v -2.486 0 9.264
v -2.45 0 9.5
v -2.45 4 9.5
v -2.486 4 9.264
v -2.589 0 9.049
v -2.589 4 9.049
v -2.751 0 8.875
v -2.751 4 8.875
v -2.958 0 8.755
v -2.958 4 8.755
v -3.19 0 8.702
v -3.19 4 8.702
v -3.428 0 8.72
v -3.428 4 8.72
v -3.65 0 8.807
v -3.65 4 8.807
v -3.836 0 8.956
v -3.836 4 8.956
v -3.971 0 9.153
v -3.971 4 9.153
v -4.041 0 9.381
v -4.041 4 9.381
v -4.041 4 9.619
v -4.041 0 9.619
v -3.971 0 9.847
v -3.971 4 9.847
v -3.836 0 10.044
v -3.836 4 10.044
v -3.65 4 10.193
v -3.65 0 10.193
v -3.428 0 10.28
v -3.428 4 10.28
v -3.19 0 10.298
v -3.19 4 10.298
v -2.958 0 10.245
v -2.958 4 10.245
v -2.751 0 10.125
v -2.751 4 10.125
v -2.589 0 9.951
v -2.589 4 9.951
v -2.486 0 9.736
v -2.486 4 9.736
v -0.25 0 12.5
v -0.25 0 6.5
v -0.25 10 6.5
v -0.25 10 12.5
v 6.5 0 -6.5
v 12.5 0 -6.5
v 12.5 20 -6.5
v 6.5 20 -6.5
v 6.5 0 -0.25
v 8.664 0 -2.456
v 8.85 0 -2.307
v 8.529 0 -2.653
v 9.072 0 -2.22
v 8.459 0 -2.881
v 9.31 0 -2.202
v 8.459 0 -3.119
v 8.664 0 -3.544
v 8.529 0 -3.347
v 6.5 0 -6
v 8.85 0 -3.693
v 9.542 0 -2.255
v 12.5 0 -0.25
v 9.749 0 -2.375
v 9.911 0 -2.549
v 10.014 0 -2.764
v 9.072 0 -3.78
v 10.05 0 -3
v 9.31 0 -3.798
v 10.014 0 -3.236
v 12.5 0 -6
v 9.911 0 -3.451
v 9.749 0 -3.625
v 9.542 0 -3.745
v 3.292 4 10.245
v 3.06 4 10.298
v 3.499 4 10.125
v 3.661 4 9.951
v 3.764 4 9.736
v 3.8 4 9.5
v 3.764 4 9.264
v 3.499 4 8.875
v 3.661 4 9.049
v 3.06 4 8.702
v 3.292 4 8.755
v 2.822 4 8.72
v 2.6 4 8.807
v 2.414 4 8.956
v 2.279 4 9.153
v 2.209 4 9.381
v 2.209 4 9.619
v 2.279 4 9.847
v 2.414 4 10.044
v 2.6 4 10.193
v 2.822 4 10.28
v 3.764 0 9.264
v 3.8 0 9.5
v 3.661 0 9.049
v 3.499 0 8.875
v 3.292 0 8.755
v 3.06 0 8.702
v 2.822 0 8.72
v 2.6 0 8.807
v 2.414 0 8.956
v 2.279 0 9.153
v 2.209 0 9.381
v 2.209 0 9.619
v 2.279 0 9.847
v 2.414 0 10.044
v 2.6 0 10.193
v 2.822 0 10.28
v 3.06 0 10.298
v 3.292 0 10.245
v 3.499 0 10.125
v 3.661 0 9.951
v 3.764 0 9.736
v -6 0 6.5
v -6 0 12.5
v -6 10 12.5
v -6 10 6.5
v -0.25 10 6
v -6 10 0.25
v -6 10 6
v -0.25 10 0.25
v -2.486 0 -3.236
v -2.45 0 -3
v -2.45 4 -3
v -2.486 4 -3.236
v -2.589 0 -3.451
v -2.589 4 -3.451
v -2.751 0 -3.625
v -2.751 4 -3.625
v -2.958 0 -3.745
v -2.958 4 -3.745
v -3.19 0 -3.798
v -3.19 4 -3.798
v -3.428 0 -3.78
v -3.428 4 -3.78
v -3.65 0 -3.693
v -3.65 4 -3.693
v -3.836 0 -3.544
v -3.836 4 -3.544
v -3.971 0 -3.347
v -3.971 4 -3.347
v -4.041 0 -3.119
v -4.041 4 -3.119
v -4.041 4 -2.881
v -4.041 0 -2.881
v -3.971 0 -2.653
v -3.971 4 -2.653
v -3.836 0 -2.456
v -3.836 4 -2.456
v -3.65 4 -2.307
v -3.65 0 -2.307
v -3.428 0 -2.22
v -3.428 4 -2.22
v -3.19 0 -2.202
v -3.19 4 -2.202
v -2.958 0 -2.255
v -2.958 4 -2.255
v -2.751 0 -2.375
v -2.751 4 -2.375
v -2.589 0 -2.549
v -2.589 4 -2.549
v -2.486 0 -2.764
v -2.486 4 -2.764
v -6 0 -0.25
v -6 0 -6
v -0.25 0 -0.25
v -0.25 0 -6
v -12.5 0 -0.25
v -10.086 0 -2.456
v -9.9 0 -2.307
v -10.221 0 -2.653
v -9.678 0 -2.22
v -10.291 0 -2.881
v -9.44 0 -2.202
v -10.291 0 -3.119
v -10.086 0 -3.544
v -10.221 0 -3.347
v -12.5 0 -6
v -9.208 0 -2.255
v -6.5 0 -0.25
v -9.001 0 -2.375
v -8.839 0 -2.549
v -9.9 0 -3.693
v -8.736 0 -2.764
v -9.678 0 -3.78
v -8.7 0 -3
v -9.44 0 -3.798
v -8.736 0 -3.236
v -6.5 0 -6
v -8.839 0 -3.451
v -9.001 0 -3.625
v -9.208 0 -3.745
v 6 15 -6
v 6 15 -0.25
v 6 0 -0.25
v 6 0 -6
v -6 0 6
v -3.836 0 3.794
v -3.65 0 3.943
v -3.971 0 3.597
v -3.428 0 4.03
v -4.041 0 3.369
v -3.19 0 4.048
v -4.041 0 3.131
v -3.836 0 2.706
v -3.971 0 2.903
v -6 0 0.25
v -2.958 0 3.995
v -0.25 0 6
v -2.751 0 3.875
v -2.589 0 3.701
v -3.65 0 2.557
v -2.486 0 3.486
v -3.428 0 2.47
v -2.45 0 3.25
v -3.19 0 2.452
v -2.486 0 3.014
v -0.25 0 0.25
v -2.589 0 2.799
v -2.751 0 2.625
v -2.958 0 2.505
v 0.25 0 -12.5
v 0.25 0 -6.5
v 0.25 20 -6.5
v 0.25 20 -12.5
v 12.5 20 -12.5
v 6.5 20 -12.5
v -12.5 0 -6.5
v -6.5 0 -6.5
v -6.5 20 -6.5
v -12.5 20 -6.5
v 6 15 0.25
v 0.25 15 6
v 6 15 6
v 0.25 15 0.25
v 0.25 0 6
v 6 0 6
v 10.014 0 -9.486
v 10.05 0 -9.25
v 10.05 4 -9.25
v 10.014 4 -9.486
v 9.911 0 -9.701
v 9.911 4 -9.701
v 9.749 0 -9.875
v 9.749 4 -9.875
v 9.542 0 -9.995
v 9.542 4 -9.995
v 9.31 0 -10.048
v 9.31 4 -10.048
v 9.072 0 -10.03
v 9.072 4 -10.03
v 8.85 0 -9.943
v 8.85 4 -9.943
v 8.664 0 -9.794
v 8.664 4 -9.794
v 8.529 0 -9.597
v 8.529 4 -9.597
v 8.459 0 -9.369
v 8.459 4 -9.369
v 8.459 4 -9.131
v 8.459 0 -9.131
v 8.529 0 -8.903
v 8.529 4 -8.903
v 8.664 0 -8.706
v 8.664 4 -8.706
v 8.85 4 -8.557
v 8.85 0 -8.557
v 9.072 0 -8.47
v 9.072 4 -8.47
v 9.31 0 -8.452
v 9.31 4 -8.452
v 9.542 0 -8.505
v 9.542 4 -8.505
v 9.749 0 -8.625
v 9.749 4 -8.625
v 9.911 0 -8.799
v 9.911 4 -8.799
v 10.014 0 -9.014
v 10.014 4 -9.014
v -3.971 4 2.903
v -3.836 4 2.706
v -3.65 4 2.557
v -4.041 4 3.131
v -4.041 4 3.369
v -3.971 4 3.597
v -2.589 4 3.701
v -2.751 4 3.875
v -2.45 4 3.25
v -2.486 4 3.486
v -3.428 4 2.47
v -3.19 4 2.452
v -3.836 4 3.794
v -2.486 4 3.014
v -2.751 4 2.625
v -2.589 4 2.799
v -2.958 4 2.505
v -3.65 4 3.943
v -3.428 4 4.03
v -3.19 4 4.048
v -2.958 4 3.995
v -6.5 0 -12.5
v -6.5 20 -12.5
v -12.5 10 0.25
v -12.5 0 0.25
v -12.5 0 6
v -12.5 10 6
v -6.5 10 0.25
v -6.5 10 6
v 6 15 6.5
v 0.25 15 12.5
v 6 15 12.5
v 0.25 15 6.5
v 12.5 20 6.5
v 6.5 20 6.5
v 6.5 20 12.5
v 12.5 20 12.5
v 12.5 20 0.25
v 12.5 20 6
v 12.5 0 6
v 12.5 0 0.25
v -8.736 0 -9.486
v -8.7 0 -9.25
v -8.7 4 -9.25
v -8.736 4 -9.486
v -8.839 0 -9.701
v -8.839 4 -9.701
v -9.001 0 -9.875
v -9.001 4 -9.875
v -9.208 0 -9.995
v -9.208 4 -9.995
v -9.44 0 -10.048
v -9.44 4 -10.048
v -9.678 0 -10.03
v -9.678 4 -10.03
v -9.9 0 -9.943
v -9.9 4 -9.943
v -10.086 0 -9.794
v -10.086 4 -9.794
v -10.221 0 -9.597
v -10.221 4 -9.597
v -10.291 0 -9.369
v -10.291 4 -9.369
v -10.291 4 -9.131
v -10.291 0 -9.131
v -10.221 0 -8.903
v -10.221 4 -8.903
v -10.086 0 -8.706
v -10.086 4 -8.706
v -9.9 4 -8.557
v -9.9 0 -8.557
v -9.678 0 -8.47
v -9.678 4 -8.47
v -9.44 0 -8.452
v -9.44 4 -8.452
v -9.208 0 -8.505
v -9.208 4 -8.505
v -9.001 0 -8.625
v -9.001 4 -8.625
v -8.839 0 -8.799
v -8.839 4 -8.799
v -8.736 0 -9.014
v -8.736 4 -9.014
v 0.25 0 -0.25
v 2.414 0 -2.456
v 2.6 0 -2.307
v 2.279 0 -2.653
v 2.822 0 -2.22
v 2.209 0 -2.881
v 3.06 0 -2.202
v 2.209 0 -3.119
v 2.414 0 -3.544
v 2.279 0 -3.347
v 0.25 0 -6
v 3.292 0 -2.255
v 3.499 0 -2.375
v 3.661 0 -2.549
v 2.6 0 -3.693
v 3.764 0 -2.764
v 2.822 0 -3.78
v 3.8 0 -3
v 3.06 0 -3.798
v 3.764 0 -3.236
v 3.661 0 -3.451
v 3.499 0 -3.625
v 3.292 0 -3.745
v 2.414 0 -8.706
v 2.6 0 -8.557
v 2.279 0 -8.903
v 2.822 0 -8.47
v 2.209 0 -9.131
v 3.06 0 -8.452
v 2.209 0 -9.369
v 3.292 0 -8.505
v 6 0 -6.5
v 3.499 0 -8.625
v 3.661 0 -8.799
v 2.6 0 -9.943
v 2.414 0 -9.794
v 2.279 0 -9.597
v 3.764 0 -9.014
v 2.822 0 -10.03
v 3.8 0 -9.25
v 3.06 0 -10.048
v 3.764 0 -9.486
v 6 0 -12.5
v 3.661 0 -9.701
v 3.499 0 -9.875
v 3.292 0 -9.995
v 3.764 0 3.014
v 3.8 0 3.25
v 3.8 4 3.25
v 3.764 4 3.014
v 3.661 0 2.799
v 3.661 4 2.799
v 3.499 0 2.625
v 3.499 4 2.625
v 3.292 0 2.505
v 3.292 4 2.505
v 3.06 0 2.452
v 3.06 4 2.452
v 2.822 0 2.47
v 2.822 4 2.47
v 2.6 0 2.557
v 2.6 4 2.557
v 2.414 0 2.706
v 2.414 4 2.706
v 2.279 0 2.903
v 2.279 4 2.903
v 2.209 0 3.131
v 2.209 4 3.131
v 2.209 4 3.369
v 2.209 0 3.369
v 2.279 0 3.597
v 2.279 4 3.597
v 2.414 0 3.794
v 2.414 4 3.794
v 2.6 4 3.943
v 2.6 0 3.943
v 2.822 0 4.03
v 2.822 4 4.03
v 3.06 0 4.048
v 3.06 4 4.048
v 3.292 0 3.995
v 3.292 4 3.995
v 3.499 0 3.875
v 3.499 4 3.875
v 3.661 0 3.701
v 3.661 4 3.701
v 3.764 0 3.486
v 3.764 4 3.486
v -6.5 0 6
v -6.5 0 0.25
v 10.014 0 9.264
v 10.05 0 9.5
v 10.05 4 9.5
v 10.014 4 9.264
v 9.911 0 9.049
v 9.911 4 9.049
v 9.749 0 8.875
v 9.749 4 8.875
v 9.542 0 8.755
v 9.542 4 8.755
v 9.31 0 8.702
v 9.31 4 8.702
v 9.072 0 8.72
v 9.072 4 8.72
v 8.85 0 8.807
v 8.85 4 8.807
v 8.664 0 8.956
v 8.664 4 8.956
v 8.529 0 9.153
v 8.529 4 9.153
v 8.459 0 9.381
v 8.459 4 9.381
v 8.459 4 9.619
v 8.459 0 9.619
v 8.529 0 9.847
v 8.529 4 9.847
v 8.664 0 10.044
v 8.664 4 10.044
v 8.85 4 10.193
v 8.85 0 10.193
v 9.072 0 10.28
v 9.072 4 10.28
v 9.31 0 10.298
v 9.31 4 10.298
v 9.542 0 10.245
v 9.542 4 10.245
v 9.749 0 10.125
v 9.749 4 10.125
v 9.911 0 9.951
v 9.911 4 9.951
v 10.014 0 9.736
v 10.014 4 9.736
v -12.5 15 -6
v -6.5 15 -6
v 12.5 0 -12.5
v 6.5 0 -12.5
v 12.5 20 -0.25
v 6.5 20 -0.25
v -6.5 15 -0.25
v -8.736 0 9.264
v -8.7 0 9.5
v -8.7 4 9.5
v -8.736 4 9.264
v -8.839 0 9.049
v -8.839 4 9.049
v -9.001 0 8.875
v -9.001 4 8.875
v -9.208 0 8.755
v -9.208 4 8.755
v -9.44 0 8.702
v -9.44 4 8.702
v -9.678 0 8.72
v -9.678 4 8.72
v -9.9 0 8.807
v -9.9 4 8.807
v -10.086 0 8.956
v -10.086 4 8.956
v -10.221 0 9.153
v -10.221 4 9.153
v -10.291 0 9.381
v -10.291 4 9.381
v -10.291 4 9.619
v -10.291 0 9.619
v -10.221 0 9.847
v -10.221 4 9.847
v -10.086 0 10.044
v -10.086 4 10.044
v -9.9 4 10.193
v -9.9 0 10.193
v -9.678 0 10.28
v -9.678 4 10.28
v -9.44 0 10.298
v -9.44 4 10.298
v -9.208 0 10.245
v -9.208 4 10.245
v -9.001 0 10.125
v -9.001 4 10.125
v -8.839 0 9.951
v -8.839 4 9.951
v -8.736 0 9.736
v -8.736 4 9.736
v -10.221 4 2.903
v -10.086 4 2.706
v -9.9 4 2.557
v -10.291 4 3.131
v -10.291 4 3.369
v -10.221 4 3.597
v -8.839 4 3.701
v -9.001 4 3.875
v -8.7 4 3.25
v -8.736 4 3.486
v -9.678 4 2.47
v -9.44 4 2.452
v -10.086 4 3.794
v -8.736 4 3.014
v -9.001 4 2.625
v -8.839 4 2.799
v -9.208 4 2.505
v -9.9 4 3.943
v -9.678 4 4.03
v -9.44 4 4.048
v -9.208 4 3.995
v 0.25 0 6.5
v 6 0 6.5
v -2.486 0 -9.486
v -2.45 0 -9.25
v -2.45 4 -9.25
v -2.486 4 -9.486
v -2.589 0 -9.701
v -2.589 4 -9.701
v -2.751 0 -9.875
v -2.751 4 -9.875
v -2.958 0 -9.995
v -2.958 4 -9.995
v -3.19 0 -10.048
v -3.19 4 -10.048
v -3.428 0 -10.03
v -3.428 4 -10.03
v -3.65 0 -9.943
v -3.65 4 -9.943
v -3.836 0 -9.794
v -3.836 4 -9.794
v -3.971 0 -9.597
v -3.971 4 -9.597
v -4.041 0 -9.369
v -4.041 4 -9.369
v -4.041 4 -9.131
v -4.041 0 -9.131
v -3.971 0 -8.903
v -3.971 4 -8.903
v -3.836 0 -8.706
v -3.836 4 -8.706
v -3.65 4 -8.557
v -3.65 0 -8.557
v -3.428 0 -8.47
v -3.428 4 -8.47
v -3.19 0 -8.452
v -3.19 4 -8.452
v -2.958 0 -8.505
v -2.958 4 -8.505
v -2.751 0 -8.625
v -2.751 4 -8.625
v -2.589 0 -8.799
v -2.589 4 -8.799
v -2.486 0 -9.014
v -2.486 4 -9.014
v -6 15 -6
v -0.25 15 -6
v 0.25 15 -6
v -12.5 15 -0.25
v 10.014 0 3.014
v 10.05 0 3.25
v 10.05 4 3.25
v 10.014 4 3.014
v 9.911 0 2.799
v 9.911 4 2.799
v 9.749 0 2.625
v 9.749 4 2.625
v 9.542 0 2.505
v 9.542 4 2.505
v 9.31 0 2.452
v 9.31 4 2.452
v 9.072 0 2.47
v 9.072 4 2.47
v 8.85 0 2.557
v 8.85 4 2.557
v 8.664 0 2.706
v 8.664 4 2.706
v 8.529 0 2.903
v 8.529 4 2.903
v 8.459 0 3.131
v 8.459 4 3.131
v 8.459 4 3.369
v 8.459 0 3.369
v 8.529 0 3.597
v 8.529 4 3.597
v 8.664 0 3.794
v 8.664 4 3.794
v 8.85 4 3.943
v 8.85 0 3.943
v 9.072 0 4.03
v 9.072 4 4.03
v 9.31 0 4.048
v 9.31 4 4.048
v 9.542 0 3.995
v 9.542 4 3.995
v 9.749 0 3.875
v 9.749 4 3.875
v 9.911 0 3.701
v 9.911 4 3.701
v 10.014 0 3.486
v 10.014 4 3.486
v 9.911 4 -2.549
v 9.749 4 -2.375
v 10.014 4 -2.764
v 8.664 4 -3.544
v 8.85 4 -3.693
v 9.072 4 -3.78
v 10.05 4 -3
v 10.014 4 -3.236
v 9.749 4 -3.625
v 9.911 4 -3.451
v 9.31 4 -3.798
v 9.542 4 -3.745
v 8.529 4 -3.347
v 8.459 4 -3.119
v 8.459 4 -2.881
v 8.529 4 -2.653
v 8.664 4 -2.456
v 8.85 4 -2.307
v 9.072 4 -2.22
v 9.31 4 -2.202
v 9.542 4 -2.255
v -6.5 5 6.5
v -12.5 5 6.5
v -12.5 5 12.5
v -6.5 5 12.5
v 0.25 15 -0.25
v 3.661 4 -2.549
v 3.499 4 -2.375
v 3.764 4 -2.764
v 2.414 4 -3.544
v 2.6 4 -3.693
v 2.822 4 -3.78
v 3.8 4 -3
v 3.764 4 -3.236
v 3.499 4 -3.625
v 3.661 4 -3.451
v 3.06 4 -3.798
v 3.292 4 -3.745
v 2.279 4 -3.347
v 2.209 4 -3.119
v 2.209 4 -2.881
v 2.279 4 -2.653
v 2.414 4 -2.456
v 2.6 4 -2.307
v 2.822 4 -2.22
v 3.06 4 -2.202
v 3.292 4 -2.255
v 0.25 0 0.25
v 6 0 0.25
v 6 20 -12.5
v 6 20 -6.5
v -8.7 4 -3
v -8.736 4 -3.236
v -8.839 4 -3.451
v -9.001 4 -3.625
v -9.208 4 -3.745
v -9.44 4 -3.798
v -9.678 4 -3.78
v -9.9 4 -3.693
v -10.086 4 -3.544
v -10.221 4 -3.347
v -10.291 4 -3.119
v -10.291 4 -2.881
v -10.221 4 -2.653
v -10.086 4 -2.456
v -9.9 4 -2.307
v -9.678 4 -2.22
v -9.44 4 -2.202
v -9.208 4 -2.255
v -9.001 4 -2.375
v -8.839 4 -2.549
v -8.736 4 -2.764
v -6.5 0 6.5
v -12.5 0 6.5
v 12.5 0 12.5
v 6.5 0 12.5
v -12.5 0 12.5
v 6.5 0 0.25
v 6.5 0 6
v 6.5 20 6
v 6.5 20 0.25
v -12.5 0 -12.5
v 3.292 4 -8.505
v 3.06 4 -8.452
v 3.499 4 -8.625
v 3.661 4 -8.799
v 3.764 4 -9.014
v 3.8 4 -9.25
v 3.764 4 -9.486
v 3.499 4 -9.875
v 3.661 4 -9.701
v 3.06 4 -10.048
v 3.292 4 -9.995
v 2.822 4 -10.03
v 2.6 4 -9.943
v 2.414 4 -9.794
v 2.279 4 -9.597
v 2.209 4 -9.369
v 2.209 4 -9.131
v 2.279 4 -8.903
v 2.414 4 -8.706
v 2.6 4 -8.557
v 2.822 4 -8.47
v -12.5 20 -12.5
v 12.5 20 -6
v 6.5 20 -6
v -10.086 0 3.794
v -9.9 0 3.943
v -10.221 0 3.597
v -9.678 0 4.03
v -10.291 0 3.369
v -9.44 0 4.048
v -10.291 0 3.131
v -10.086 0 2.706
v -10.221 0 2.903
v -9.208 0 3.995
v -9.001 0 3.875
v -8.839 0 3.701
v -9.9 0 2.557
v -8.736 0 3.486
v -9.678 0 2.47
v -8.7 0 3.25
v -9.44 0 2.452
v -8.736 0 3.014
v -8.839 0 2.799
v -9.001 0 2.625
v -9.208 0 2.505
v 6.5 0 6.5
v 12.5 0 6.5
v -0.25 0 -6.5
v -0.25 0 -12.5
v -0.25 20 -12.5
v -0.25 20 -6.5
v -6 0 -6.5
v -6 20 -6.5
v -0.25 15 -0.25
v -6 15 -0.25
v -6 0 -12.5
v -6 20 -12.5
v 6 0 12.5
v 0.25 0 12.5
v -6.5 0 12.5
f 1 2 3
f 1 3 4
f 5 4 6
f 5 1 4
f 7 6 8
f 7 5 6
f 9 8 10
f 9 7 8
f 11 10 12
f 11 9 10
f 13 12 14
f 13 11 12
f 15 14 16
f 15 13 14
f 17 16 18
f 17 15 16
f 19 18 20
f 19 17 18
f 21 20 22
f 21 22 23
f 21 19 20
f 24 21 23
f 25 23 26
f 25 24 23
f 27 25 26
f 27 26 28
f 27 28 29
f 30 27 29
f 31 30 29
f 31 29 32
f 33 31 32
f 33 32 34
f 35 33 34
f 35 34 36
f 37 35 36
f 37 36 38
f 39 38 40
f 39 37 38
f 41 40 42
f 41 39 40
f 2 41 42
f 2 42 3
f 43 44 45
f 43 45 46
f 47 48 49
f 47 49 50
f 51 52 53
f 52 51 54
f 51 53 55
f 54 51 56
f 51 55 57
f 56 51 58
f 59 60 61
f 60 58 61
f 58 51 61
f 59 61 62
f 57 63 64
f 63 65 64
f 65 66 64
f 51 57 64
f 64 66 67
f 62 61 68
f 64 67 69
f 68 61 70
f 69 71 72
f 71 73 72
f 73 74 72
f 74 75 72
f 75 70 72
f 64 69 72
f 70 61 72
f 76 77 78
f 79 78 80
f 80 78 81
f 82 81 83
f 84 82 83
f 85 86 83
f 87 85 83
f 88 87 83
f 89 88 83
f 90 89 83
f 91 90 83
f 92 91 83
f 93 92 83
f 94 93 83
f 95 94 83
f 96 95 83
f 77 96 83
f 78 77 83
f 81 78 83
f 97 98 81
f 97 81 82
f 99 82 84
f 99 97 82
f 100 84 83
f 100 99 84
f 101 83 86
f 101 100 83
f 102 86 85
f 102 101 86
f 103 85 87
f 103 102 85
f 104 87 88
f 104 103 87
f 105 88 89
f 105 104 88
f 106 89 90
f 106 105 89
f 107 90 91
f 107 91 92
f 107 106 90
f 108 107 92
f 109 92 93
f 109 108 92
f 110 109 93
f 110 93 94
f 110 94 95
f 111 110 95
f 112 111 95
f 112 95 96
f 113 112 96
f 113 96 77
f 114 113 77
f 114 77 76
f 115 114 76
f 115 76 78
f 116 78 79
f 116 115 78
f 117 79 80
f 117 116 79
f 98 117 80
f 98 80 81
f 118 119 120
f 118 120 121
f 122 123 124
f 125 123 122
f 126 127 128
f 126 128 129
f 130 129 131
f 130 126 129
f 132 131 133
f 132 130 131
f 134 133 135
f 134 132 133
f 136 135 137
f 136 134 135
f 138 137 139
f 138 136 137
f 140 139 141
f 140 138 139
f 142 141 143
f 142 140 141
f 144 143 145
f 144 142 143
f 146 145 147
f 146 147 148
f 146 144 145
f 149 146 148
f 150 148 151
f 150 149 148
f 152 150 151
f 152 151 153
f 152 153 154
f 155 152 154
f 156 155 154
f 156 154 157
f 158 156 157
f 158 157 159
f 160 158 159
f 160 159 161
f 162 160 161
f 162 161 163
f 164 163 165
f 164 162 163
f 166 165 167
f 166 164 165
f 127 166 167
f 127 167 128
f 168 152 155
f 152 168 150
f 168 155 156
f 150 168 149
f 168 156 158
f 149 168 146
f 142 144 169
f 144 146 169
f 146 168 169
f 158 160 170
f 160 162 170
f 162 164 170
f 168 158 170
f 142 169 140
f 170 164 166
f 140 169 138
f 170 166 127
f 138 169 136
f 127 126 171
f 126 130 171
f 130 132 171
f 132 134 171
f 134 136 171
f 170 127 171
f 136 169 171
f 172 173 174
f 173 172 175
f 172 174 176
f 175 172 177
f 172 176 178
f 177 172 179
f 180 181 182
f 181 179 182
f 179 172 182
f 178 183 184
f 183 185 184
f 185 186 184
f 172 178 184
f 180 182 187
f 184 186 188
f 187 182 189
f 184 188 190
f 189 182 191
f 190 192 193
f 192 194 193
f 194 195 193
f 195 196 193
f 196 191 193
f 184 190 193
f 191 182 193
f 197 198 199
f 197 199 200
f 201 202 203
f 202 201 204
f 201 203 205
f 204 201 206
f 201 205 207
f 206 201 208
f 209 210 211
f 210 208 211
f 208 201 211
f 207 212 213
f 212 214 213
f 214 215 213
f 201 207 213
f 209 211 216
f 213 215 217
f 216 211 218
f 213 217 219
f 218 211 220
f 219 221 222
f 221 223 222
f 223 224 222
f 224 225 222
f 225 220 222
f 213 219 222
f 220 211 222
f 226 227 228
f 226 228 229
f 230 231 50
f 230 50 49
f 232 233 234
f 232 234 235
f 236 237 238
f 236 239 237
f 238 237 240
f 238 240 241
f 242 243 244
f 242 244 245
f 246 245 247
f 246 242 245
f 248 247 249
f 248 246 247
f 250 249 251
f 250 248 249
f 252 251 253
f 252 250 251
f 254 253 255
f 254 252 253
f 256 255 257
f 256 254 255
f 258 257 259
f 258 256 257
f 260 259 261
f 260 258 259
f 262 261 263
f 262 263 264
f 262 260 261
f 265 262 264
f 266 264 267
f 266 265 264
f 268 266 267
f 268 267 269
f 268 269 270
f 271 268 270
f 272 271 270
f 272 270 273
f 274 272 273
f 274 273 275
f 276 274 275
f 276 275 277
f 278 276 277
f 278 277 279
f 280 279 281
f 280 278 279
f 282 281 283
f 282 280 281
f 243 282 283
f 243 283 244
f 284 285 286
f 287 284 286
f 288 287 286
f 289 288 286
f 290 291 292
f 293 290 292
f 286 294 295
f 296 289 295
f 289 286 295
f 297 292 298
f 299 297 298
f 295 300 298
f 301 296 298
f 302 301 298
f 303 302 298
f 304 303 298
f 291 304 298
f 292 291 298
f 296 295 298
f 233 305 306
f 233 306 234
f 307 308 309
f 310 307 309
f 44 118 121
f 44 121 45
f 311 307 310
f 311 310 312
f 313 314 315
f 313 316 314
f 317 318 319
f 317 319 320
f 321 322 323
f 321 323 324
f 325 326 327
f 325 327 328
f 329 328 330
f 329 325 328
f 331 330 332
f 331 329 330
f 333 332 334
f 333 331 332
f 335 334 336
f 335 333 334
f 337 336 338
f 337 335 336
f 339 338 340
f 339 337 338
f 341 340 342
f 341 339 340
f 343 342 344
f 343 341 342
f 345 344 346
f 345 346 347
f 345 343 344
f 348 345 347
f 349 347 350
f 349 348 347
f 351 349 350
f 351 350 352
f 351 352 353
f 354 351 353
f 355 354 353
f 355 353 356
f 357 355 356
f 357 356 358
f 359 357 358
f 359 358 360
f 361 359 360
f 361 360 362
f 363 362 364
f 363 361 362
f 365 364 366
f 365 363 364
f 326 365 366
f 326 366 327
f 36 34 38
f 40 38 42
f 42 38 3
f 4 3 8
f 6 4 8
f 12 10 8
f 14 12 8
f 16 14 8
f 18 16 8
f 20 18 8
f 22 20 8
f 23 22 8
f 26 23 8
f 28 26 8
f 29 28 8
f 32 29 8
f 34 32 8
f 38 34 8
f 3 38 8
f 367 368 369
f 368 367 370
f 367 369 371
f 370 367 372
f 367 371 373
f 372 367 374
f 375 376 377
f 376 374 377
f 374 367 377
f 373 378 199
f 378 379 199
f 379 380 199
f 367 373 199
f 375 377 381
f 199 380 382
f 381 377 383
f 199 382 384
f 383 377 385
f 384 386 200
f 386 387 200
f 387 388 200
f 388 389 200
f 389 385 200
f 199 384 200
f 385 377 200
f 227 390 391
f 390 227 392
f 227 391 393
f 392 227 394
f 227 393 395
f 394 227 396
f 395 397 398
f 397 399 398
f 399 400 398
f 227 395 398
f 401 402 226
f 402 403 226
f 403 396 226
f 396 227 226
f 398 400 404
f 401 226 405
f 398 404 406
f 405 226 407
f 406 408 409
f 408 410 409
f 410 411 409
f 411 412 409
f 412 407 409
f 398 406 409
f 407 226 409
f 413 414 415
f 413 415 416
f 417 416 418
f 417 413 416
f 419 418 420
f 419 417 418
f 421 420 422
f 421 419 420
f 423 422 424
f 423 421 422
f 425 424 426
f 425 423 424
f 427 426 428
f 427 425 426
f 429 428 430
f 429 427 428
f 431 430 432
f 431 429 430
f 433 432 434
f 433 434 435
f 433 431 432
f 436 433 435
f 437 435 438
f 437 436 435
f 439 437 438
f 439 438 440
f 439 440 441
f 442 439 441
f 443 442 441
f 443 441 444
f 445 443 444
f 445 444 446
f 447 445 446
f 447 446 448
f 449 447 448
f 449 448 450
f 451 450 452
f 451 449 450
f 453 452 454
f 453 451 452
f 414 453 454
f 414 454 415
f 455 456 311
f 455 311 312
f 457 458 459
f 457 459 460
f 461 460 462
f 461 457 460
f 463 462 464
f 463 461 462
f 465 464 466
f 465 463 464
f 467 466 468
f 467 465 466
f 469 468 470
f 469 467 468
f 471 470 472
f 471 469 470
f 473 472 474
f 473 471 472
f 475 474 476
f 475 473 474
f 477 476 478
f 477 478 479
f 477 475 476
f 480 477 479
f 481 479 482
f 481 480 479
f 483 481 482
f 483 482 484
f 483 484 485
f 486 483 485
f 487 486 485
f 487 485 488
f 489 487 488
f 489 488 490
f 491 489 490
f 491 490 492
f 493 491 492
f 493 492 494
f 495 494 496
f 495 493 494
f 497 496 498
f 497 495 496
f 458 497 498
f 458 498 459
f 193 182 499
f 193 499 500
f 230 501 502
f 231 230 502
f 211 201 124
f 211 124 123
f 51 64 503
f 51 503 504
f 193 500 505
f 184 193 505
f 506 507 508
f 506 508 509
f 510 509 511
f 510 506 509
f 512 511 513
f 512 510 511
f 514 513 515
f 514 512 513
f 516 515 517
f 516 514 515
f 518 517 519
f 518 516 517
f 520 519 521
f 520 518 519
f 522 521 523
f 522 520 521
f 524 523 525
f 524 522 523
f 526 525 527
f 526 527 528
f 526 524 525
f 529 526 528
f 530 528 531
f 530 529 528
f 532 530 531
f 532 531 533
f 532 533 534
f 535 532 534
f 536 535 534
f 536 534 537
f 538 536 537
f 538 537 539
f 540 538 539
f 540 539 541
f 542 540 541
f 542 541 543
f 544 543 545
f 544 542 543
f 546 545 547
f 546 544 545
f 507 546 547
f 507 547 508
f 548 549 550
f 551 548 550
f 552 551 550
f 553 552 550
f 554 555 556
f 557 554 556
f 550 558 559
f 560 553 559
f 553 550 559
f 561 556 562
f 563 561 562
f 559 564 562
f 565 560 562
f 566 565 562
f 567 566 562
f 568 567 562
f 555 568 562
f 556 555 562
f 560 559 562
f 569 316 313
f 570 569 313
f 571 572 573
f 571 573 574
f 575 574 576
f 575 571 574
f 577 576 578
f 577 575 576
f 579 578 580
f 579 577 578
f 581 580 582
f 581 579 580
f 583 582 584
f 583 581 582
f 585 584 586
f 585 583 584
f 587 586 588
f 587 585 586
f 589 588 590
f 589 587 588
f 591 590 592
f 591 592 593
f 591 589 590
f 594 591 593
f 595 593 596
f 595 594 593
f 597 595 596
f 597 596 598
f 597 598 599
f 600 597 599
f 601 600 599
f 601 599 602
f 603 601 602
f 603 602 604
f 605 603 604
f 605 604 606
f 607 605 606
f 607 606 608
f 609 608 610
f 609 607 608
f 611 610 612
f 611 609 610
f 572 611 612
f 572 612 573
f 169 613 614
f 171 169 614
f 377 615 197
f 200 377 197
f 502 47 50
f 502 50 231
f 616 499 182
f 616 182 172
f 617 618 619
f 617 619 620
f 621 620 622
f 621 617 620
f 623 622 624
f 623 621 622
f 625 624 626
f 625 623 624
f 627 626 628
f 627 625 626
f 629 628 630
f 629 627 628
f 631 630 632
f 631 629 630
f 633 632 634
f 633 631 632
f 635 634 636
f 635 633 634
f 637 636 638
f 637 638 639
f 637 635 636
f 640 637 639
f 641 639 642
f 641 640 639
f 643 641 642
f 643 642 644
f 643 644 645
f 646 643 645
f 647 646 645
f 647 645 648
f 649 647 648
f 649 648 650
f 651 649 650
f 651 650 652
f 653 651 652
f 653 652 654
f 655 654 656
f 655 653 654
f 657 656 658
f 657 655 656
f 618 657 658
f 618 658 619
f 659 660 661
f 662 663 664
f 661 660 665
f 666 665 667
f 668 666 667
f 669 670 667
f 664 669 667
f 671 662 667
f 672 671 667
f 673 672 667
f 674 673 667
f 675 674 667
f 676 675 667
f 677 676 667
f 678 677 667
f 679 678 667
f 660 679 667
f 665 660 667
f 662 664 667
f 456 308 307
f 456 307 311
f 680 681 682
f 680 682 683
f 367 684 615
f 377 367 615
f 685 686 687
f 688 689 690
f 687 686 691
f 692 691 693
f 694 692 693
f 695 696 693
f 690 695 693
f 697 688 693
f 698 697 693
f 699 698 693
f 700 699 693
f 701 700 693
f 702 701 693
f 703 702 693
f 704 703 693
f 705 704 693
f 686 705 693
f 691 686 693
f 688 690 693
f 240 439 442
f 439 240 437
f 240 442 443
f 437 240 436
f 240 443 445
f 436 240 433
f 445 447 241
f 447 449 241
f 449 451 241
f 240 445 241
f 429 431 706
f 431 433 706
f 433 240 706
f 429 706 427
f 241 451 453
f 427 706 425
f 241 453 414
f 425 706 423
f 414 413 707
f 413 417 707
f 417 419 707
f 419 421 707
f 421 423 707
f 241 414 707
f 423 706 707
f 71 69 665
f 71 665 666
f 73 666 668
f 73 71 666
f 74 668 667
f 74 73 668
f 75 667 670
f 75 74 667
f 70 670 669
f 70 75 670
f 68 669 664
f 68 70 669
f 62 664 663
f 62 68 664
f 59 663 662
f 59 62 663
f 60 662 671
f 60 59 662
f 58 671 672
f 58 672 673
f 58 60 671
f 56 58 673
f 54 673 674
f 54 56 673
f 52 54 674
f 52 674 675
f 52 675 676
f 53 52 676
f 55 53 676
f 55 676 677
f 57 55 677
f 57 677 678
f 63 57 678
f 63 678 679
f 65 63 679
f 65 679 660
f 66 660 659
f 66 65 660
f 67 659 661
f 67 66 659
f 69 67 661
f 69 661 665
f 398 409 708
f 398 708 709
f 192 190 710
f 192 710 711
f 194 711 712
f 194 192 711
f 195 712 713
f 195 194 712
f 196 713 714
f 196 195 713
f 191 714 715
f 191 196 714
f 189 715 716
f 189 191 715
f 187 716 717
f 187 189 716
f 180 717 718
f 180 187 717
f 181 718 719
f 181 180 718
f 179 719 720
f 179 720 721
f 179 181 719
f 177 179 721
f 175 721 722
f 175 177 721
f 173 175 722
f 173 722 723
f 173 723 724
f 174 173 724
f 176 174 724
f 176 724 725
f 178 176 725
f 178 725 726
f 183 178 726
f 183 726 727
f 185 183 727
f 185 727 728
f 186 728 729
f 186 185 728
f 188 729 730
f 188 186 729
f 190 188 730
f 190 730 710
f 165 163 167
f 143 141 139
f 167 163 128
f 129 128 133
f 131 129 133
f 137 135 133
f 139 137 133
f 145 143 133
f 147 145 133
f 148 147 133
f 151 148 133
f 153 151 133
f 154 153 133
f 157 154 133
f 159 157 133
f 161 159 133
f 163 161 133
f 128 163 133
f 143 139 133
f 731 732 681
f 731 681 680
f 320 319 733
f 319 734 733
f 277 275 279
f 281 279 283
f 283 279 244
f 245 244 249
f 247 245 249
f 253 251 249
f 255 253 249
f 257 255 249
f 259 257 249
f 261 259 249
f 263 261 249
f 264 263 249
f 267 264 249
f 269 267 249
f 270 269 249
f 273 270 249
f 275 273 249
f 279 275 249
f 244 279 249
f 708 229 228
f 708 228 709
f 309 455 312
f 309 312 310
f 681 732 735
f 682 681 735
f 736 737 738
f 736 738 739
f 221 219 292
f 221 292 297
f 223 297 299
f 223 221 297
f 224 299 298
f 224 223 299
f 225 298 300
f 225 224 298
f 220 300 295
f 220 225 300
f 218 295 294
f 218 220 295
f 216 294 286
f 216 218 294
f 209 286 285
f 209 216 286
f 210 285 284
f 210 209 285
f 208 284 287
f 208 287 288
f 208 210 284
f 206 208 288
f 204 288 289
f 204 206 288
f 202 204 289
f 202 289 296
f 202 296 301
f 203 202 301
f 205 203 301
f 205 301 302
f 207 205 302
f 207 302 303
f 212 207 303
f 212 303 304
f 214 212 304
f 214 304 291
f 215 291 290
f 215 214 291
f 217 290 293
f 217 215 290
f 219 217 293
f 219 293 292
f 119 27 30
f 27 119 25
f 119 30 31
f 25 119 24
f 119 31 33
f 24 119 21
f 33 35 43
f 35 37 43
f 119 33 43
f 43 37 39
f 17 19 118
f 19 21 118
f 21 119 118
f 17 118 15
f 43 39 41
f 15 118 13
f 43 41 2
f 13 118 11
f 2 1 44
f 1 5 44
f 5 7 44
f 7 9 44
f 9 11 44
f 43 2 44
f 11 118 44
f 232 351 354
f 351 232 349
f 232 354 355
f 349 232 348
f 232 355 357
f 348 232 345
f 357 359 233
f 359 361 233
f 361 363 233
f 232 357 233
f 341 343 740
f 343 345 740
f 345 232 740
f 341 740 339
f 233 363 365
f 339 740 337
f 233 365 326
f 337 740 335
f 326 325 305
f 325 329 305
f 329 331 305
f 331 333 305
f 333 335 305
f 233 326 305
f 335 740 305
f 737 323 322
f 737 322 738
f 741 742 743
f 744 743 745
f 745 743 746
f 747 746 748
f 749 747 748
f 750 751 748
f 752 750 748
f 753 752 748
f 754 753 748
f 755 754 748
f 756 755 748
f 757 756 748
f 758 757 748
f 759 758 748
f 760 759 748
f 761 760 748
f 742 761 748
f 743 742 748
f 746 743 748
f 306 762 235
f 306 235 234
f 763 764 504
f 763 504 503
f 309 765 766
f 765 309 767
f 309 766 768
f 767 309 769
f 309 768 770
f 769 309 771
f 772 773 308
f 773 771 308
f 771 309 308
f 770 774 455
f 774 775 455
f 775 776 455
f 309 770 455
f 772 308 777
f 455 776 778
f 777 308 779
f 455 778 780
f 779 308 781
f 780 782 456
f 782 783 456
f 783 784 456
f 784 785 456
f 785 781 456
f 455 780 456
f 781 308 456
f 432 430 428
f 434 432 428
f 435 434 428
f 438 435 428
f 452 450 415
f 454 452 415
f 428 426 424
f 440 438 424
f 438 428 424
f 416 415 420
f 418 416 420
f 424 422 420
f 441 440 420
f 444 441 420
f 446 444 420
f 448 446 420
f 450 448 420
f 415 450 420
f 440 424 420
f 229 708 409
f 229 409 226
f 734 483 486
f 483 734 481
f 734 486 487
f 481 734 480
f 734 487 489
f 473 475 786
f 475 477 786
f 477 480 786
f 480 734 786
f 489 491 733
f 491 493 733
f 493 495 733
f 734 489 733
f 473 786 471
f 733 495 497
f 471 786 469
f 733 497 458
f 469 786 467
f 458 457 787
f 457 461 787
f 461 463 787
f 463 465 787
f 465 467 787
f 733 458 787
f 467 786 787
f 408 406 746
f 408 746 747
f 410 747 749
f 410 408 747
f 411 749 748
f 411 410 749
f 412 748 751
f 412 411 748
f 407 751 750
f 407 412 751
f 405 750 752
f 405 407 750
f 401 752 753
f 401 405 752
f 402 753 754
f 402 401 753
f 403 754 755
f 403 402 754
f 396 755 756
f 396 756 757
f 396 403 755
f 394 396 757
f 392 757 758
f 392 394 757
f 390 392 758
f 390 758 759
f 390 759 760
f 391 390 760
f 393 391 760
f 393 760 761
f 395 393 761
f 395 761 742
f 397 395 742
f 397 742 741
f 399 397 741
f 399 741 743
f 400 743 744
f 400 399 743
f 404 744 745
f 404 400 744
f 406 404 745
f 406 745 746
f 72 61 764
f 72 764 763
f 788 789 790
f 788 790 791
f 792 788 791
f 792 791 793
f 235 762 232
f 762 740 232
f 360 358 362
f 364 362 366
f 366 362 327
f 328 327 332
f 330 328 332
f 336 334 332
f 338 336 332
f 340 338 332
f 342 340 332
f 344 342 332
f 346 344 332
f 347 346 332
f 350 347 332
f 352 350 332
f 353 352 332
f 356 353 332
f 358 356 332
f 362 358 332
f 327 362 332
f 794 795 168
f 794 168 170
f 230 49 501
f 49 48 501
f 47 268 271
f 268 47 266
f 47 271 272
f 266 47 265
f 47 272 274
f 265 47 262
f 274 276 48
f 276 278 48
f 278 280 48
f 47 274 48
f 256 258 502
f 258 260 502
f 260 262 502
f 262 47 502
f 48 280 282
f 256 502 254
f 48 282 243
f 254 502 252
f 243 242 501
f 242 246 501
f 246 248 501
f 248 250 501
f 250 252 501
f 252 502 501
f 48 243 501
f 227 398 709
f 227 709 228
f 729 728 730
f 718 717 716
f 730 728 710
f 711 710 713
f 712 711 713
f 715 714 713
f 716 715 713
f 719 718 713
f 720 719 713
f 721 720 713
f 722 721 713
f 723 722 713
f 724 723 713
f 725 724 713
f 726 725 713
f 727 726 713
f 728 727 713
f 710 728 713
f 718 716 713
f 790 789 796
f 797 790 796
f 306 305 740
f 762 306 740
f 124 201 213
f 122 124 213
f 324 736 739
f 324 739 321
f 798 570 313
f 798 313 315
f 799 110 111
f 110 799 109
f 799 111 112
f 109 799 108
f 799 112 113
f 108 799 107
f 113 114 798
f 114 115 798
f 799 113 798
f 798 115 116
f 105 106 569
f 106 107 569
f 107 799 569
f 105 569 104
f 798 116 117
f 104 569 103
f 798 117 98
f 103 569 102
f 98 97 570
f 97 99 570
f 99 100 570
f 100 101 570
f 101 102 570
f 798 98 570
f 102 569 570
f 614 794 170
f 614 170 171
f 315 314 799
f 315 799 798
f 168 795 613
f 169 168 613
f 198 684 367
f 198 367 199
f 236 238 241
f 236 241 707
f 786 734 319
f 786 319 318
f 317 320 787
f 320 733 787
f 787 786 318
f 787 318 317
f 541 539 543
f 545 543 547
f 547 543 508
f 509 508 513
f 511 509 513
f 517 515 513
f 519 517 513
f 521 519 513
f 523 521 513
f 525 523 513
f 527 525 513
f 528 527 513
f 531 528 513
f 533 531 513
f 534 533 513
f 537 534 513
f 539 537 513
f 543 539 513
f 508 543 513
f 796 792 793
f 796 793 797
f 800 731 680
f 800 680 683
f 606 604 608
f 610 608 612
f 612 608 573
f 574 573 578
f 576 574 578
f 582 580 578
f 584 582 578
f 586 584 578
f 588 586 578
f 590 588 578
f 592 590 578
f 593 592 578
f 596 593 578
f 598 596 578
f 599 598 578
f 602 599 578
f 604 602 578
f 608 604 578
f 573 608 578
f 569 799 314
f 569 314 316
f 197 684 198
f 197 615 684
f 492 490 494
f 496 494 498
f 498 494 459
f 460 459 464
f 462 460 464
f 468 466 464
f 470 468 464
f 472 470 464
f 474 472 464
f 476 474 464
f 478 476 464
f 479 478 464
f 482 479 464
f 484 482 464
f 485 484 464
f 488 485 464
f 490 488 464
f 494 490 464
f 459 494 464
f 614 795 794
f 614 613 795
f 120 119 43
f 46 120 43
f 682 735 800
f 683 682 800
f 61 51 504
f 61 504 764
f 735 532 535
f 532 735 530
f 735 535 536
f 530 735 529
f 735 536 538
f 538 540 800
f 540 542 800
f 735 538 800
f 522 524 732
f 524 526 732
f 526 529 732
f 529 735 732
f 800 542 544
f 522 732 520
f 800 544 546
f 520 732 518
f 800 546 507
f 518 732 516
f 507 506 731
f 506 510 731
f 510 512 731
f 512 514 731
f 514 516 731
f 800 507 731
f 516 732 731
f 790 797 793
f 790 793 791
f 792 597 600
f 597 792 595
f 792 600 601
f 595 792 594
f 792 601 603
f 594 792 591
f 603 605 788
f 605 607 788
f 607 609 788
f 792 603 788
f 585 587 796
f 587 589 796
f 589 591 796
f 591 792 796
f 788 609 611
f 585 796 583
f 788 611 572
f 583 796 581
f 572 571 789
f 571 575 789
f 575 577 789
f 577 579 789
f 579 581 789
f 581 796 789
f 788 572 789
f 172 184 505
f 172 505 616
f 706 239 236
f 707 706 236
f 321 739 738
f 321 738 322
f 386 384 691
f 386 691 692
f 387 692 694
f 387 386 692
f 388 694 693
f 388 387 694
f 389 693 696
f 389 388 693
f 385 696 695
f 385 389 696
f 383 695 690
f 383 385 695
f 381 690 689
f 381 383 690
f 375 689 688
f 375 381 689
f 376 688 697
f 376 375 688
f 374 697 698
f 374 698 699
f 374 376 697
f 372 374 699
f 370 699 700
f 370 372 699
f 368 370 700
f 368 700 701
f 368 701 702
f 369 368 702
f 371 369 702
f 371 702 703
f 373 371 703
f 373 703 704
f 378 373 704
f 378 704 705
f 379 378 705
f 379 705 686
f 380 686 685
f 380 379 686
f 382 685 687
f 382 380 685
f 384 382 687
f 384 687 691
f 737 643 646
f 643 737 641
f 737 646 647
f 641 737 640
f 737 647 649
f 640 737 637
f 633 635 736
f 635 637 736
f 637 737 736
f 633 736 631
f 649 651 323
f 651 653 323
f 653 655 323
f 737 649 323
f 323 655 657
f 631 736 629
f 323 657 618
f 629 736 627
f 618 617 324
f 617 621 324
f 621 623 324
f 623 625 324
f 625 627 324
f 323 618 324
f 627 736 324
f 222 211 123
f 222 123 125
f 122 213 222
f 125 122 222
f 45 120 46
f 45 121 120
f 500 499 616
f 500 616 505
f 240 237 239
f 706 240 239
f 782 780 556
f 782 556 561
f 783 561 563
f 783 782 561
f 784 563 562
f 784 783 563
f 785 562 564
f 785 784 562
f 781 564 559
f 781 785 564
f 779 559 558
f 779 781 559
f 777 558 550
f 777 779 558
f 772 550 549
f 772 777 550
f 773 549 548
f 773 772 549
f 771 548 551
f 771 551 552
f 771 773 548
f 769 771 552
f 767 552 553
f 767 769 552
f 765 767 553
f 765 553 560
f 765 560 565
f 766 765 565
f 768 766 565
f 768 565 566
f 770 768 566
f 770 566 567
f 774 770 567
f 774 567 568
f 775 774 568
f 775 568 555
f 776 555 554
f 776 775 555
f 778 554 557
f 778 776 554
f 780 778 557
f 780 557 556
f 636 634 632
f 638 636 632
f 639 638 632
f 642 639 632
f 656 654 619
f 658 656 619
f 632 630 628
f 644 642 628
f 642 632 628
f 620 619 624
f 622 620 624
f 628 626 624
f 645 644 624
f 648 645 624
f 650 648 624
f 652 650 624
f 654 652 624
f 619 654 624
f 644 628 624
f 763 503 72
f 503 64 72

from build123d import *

# Parameters (mm, degrees)
SKETCH1_W           = 25
SKETCH1_H           = 25
BOSS_EXTRUDE1_DEPTH = 5
BOSS_EXTRUDE2_DEPTH = 10
BOSS_EXTRUDE3_DEPTH = 15
BOSS_EXTRUDE4_DEPTH = 20
SKETCH3_W           = 5.75
SKETCH3_H           = 5.75
CUT_EXTRUDE1_DEPTH  = 27.69269563
SKETCH4_R           = 0.8
CUT_EXTRUDE2_DEPTH  = 4


with BuildPart() as part:
    # Sketch1 → Boss-Extrude1 (new body)
    with BuildSketch(Plane(origin=(0, 0, 0), x_dir=(1, 0, 0), z_dir=(0, 1, 0))):
        Rectangle(SKETCH1_W, SKETCH1_H)
    extrude(amount=BOSS_EXTRUDE1_DEPTH)

    # Sketch2 → Boss-Extrude2 (add)
    with BuildSketch(Plane(origin=(0, 0, 0), x_dir=(1, 0, 0), z_dir=(0, 1, 0))):
        Polygon((-12.5, -6.25), (-6.25, -6.25), (-6.25, -12.5), (12.5, -12.5), (12.5, 12.5), (-12.5, 12.5), align=None)
    extrude(amount=BOSS_EXTRUDE2_DEPTH)

    # Sketch2<3> → Boss-Extrude3 (add)
    with BuildSketch(Plane(origin=(0, 0, 0), x_dir=(1, 0, 0), z_dir=(0, 1, 0))):
        Polygon((-12.5, 0), (0, 0), (0, -12.5), (12.5, -12.5), (12.5, 12.5), (-12.5, 12.5), align=None)
    extrude(amount=BOSS_EXTRUDE3_DEPTH)

    # Sketch2<4> → Boss-Extrude4 (add)
    with BuildSketch(Plane(origin=(0, 0, 0), x_dir=(1, 0, 0), z_dir=(0, 1, 0))):
        Polygon((-12.5, 6.25), (6.25, 6.25), (6.25, -12.5), (12.5, -12.5), (12.5, 12.5), (-12.5, 12.5), align=None)
    extrude(amount=BOSS_EXTRUDE4_DEPTH)

    # Sketch3 → Cut-Extrude1 (cut, through all)
    with BuildSketch(Plane(origin=(0, 0, 0), x_dir=(1, 0, 0), z_dir=(0, 1, 0))):
        with BuildLine():
            ThreePointArc((-12.5, 0.25), (-12.75, 0), (-12.5, -0.25))
            Line((-12.5, -0.25), (-6.5, -0.25))
            Line((-6.5, -0.25), (-6.5, -6))
            Line((-6.5, -6), (-12.5, -6))
            ThreePointArc((-12.5, -6), (-12.75, -6.25), (-12.5, -6.5))
            Line((-12.5, -6.5), (-6.5, -6.5))
            Line((-6.5, -6.5), (-6.5, -12.5))
            ThreePointArc((-6.5, -12.5), (-6.25, -12.75), (-6, -12.5))
            Line((-6, -12.5), (-6, -6.5))
            Line((-6, -6.5), (-0.25, -6.5))
            Line((-0.25, -6.5), (-0.25, -12.5))
            ThreePointArc((-0.25, -12.5), (0, -12.75), (0.25, -12.5))
            Line((0.25, -12.5), (0.25, -6.5))
            Line((0.25, -6.5), (6, -6.5))
            Line((6, -6.5), (6, -12.5))
            ThreePointArc((6, -12.5), (6.25, -12.75), (6.5, -12.5))
            Line((6.5, -12.5), (6.5, -6.5))
            Line((6.5, -6.5), (12.5, -6.5))
            ThreePointArc((12.5, -6.5), (12.75, -6.25), (12.5, -6))
            Line((12.5, -6), (6.5, -6))
            Line((6.5, -6), (6.5, -0.25))
            Line((6.5, -0.25), (12.5, -0.25))
            ThreePointArc((12.5, -0.25), (12.75, 0), (12.5, 0.25))
            Line((12.5, 0.25), (6.5, 0.25))
            Line((6.5, 0.25), (6.5, 6))
            Line((6.5, 6), (12.5, 6))
            ThreePointArc((12.5, 6), (12.75, 6.25), (12.5, 6.5))
            Line((12.5, 6.5), (6.5, 6.5))
            Line((6.5, 6.5), (6.5, 12.5))
            ThreePointArc((6.5, 12.5), (6.25, 12.75), (6, 12.5))
            Line((6, 12.5), (6, 6.5))
            Line((6, 6.5), (0.25, 6.5))
            Line((0.25, 6.5), (0.25, 12.5))
            ThreePointArc((0.25, 12.5), (0, 12.75), (-0.25, 12.5))
            Line((-0.25, 12.5), (-0.25, 6.5))
            Line((-0.25, 6.5), (-6, 6.5))
            Line((-6, 6.5), (-6, 12.5))
            ThreePointArc((-6, 12.5), (-6.25, 12.75), (-6.5, 12.5))
            Line((-6.5, 12.5), (-6.5, 6.5))
            Line((-6.5, 6.5), (-12.5, 6.5))
            ThreePointArc((-12.5, 6.5), (-12.75, 6.25), (-12.5, 6))
            Line((-12.5, 6), (-6.5, 6))
            Line((-6.5, 6), (-6.5, 0.25))
            Line((-6.5, 0.25), (-12.5, 0.25))
        make_face()
        with Locations((-3.125, -3.125)):
            Rectangle(SKETCH3_W, SKETCH3_H, mode=Mode.SUBTRACT)
        with Locations((3.125, -3.125)):
            Rectangle(SKETCH3_W, SKETCH3_H, mode=Mode.SUBTRACT)
        with Locations((-3.125, 3.125)):
            Rectangle(SKETCH3_W, SKETCH3_H, mode=Mode.SUBTRACT)
        with Locations((3.125, 3.125)):
            Rectangle(SKETCH3_W, SKETCH3_H, mode=Mode.SUBTRACT)
    extrude(amount=CUT_EXTRUDE1_DEPTH, mode=Mode.SUBTRACT)


with BuildPart() as cut_extrude1_piece_1:
    # of the separate pieces the step leaves, piece 1, a body of its own (cut_extrude1_pieces)
    add(part.part.solids().sort_by_distance((-12.5, 0, -6.5))[0])


with BuildPart() as cut_extrude1_piece_2:
    # of the separate pieces the step leaves, piece 2, a body of its own (cut_extrude1_pieces)
    add(part.part.solids().sort_by_distance((6.5, 0, -6.5))[0])


with BuildPart() as cut_extrude1_piece_3:
    # of the separate pieces the step leaves, piece 3, a body of its own (cut_extrude1_pieces)
    add(part.part.solids().sort_by_distance((6.5, 0, 12.5))[0])


with BuildPart() as cut_extrude1_piece_4:
    # of the separate pieces the step leaves, piece 4, a body of its own (cut_extrude1_pieces)
    add(part.part.solids().sort_by_distance((0.25, 0, -6.5))[0])


with BuildPart() as cut_extrude1_piece_5:
    # of the separate pieces the step leaves, piece 5, a body of its own (cut_extrude1_pieces)
    add(part.part.solids().sort_by_distance((-6, 0, -6.5))[0])


with BuildPart() as cut_extrude1_piece_6:
    # of the separate pieces the step leaves, piece 6, a body of its own (cut_extrude1_pieces)
    add(part.part.solids().sort_by_distance((6.5, 0, 0.25))[0])


with BuildPart() as cut_extrude1_piece_7:
    # of the separate pieces the step leaves, piece 7, a body of its own (cut_extrude1_pieces)
    add(part.part.solids().sort_by_distance((6.5, 0, -6))[0])


with BuildPart() as cut_extrude1_piece_8:
    # of the separate pieces the step leaves, piece 8, a body of its own (cut_extrude1_pieces)
    add(part.part.solids().sort_by_distance((0.25, 0, 12.5))[0])


with BuildPart() as cut_extrude1_piece_9:
    # of the separate pieces the step leaves, piece 9, a body of its own (cut_extrude1_pieces)
    add(part.part.solids().sort_by_distance((-12.5, 0, -0.25))[0])


with BuildPart() as cut_extrude1_piece_10:
    # of the separate pieces the step leaves, piece 10, a body of its own (cut_extrude1_pieces)
    add(part.part.solids().sort_by_distance((6, 0, 6))[0])


with BuildPart() as cut_extrude1_piece_11:
    # of the separate pieces the step leaves, piece 11, a body of its own (cut_extrude1_pieces)
    add(part.part.solids().sort_by_distance((6, 0, -0.25))[0])


with BuildPart() as cut_extrude1_piece_12:
    # of the separate pieces the step leaves, piece 12, a body of its own (cut_extrude1_pieces)
    add(part.part.solids().sort_by_distance((-0.25, 0, -0.25))[0])


with BuildPart() as cut_extrude1_piece_13:
    # of the separate pieces the step leaves, piece 13, a body of its own (cut_extrude1_pieces)
    add(part.part.solids().sort_by_distance((-12.5, 0, 6))[0])


with BuildPart() as cut_extrude1_piece_14:
    # of the separate pieces the step leaves, piece 14, a body of its own (cut_extrude1_pieces)
    add(part.part.solids().sort_by_distance((-6, 0, 12.5))[0])


with BuildPart() as cut_extrude1_piece_15:
    # of the separate pieces the step leaves, piece 15, a body of its own (cut_extrude1_pieces)
    add(part.part.solids().sort_by_distance((-0.25, 0, 6))[0])


with BuildPart() as cut_extrude1_piece_16:
    # of the separate pieces the step leaves, piece 16, a body of its own (cut_extrude1_pieces)
    add(part.part.solids().sort_by_distance((-12.5, 0, 12.5))[0])


with BuildPart() as cut_extrude2_tool:
    # Sketch4 → Cut-Extrude2 (new body)
    with BuildSketch(Plane(origin=(0, 0, 0), x_dir=(1, 0, 0), z_dir=(0, 1, 0))):
        with Locations((-9.5, -9.5)):
            Circle(SKETCH4_R)
        with Locations((-3.25, -9.5)):
            Circle(SKETCH4_R)
        with Locations((3, -9.5)):
            Circle(SKETCH4_R)
        with Locations((9.25, -9.5)):
            Circle(SKETCH4_R)
        with Locations((-3.25, -3.25)):
            Circle(SKETCH4_R)
        with Locations((3, -3.25)):
            Circle(SKETCH4_R)
        with Locations((9.25, -3.25)):
            Circle(SKETCH4_R)
        with Locations((-3.25, 3)):
            Circle(SKETCH4_R)
        with Locations((3, 3)):
            Circle(SKETCH4_R)
        with Locations((9.25, 3)):
            Circle(SKETCH4_R)
        with Locations((-3.25, 9.25)):
            Circle(SKETCH4_R)
        with Locations((3, 9.25)):
            Circle(SKETCH4_R)
        with Locations((9.25, 9.25)):
            Circle(SKETCH4_R)
        with Locations((-9.5, -3.25)):
            Circle(SKETCH4_R)
        with Locations((-9.5, 3)):
            Circle(SKETCH4_R)
        with Locations((-9.5, 9.25)):
            Circle(SKETCH4_R)
    extrude(amount=CUT_EXTRUDE2_DEPTH)


with BuildPart() as cut_extrude1_piece_1_1:
    add(cut_extrude1_piece_1.part)

    # Cut-Extrude2: cut by cut_extrude2_tool
    add(cut_extrude2_tool.part, mode=Mode.SUBTRACT)


with BuildPart() as cut_extrude1_piece_2_1:
    add(cut_extrude1_piece_2.part)

    # Cut-Extrude2: cut by cut_extrude2_tool
    add(cut_extrude2_tool.part, mode=Mode.SUBTRACT)


with BuildPart() as cut_extrude1_piece_3_1:
    add(cut_extrude1_piece_3.part)

    # Cut-Extrude2: cut by cut_extrude2_tool
    add(cut_extrude2_tool.part, mode=Mode.SUBTRACT)


with BuildPart() as cut_extrude1_piece_4_1:
    add(cut_extrude1_piece_4.part)

    # Cut-Extrude2: cut by cut_extrude2_tool
    add(cut_extrude2_tool.part, mode=Mode.SUBTRACT)


with BuildPart() as cut_extrude1_piece_5_1:
    add(cut_extrude1_piece_5.part)

    # Cut-Extrude2: cut by cut_extrude2_tool
    add(cut_extrude2_tool.part, mode=Mode.SUBTRACT)


with BuildPart() as cut_extrude1_piece_6_1:
    add(cut_extrude1_piece_6.part)

    # Cut-Extrude2: cut by cut_extrude2_tool
    add(cut_extrude2_tool.part, mode=Mode.SUBTRACT)


with BuildPart() as cut_extrude1_piece_7_1:
    add(cut_extrude1_piece_7.part)

    # Cut-Extrude2: cut by cut_extrude2_tool
    add(cut_extrude2_tool.part, mode=Mode.SUBTRACT)


with BuildPart() as cut_extrude1_piece_8_1:
    add(cut_extrude1_piece_8.part)

    # Cut-Extrude2: cut by cut_extrude2_tool
    add(cut_extrude2_tool.part, mode=Mode.SUBTRACT)


with BuildPart() as cut_extrude1_piece_9_1:
    add(cut_extrude1_piece_9.part)

    # Cut-Extrude2: cut by cut_extrude2_tool
    add(cut_extrude2_tool.part, mode=Mode.SUBTRACT)


with BuildPart() as cut_extrude1_piece_10_1:
    add(cut_extrude1_piece_10.part)

    # Cut-Extrude2: cut by cut_extrude2_tool
    add(cut_extrude2_tool.part, mode=Mode.SUBTRACT)


with BuildPart() as cut_extrude1_piece_11_1:
    add(cut_extrude1_piece_11.part)

    # Cut-Extrude2: cut by cut_extrude2_tool
    add(cut_extrude2_tool.part, mode=Mode.SUBTRACT)


with BuildPart() as cut_extrude1_piece_12_1:
    add(cut_extrude1_piece_12.part)

    # Cut-Extrude2: cut by cut_extrude2_tool
    add(cut_extrude2_tool.part, mode=Mode.SUBTRACT)


with BuildPart() as cut_extrude1_piece_13_1:
    add(cut_extrude1_piece_13.part)

    # Cut-Extrude2: cut by cut_extrude2_tool
    add(cut_extrude2_tool.part, mode=Mode.SUBTRACT)


with BuildPart() as cut_extrude1_piece_14_1:
    add(cut_extrude1_piece_14.part)

    # Cut-Extrude2: cut by cut_extrude2_tool
    add(cut_extrude2_tool.part, mode=Mode.SUBTRACT)


with BuildPart() as cut_extrude1_piece_15_1:
    add(cut_extrude1_piece_15.part)

    # Cut-Extrude2: cut by cut_extrude2_tool
    add(cut_extrude2_tool.part, mode=Mode.SUBTRACT)


with BuildPart() as cut_extrude1_piece_16_1:
    add(cut_extrude1_piece_16.part)

    # Cut-Extrude2: cut by cut_extrude2_tool
    add(cut_extrude2_tool.part, mode=Mode.SUBTRACT)


solid = Compound([cut_extrude1_piece_1_1.part, cut_extrude1_piece_2_1.part, cut_extrude1_piece_3_1.part, cut_extrude1_piece_4_1.part, cut_extrude1_piece_5_1.part, cut_extrude1_piece_6_1.part, cut_extrude1_piece_7_1.part, cut_extrude1_piece_8_1.part, cut_extrude1_piece_9_1.part, cut_extrude1_piece_10_1.part, cut_extrude1_piece_11_1.part, cut_extrude1_piece_12_1.part, cut_extrude1_piece_13_1.part, cut_extrude1_piece_14_1.part, cut_extrude1_piece_15_1.part, cut_extrude1_piece_16_1.part])
